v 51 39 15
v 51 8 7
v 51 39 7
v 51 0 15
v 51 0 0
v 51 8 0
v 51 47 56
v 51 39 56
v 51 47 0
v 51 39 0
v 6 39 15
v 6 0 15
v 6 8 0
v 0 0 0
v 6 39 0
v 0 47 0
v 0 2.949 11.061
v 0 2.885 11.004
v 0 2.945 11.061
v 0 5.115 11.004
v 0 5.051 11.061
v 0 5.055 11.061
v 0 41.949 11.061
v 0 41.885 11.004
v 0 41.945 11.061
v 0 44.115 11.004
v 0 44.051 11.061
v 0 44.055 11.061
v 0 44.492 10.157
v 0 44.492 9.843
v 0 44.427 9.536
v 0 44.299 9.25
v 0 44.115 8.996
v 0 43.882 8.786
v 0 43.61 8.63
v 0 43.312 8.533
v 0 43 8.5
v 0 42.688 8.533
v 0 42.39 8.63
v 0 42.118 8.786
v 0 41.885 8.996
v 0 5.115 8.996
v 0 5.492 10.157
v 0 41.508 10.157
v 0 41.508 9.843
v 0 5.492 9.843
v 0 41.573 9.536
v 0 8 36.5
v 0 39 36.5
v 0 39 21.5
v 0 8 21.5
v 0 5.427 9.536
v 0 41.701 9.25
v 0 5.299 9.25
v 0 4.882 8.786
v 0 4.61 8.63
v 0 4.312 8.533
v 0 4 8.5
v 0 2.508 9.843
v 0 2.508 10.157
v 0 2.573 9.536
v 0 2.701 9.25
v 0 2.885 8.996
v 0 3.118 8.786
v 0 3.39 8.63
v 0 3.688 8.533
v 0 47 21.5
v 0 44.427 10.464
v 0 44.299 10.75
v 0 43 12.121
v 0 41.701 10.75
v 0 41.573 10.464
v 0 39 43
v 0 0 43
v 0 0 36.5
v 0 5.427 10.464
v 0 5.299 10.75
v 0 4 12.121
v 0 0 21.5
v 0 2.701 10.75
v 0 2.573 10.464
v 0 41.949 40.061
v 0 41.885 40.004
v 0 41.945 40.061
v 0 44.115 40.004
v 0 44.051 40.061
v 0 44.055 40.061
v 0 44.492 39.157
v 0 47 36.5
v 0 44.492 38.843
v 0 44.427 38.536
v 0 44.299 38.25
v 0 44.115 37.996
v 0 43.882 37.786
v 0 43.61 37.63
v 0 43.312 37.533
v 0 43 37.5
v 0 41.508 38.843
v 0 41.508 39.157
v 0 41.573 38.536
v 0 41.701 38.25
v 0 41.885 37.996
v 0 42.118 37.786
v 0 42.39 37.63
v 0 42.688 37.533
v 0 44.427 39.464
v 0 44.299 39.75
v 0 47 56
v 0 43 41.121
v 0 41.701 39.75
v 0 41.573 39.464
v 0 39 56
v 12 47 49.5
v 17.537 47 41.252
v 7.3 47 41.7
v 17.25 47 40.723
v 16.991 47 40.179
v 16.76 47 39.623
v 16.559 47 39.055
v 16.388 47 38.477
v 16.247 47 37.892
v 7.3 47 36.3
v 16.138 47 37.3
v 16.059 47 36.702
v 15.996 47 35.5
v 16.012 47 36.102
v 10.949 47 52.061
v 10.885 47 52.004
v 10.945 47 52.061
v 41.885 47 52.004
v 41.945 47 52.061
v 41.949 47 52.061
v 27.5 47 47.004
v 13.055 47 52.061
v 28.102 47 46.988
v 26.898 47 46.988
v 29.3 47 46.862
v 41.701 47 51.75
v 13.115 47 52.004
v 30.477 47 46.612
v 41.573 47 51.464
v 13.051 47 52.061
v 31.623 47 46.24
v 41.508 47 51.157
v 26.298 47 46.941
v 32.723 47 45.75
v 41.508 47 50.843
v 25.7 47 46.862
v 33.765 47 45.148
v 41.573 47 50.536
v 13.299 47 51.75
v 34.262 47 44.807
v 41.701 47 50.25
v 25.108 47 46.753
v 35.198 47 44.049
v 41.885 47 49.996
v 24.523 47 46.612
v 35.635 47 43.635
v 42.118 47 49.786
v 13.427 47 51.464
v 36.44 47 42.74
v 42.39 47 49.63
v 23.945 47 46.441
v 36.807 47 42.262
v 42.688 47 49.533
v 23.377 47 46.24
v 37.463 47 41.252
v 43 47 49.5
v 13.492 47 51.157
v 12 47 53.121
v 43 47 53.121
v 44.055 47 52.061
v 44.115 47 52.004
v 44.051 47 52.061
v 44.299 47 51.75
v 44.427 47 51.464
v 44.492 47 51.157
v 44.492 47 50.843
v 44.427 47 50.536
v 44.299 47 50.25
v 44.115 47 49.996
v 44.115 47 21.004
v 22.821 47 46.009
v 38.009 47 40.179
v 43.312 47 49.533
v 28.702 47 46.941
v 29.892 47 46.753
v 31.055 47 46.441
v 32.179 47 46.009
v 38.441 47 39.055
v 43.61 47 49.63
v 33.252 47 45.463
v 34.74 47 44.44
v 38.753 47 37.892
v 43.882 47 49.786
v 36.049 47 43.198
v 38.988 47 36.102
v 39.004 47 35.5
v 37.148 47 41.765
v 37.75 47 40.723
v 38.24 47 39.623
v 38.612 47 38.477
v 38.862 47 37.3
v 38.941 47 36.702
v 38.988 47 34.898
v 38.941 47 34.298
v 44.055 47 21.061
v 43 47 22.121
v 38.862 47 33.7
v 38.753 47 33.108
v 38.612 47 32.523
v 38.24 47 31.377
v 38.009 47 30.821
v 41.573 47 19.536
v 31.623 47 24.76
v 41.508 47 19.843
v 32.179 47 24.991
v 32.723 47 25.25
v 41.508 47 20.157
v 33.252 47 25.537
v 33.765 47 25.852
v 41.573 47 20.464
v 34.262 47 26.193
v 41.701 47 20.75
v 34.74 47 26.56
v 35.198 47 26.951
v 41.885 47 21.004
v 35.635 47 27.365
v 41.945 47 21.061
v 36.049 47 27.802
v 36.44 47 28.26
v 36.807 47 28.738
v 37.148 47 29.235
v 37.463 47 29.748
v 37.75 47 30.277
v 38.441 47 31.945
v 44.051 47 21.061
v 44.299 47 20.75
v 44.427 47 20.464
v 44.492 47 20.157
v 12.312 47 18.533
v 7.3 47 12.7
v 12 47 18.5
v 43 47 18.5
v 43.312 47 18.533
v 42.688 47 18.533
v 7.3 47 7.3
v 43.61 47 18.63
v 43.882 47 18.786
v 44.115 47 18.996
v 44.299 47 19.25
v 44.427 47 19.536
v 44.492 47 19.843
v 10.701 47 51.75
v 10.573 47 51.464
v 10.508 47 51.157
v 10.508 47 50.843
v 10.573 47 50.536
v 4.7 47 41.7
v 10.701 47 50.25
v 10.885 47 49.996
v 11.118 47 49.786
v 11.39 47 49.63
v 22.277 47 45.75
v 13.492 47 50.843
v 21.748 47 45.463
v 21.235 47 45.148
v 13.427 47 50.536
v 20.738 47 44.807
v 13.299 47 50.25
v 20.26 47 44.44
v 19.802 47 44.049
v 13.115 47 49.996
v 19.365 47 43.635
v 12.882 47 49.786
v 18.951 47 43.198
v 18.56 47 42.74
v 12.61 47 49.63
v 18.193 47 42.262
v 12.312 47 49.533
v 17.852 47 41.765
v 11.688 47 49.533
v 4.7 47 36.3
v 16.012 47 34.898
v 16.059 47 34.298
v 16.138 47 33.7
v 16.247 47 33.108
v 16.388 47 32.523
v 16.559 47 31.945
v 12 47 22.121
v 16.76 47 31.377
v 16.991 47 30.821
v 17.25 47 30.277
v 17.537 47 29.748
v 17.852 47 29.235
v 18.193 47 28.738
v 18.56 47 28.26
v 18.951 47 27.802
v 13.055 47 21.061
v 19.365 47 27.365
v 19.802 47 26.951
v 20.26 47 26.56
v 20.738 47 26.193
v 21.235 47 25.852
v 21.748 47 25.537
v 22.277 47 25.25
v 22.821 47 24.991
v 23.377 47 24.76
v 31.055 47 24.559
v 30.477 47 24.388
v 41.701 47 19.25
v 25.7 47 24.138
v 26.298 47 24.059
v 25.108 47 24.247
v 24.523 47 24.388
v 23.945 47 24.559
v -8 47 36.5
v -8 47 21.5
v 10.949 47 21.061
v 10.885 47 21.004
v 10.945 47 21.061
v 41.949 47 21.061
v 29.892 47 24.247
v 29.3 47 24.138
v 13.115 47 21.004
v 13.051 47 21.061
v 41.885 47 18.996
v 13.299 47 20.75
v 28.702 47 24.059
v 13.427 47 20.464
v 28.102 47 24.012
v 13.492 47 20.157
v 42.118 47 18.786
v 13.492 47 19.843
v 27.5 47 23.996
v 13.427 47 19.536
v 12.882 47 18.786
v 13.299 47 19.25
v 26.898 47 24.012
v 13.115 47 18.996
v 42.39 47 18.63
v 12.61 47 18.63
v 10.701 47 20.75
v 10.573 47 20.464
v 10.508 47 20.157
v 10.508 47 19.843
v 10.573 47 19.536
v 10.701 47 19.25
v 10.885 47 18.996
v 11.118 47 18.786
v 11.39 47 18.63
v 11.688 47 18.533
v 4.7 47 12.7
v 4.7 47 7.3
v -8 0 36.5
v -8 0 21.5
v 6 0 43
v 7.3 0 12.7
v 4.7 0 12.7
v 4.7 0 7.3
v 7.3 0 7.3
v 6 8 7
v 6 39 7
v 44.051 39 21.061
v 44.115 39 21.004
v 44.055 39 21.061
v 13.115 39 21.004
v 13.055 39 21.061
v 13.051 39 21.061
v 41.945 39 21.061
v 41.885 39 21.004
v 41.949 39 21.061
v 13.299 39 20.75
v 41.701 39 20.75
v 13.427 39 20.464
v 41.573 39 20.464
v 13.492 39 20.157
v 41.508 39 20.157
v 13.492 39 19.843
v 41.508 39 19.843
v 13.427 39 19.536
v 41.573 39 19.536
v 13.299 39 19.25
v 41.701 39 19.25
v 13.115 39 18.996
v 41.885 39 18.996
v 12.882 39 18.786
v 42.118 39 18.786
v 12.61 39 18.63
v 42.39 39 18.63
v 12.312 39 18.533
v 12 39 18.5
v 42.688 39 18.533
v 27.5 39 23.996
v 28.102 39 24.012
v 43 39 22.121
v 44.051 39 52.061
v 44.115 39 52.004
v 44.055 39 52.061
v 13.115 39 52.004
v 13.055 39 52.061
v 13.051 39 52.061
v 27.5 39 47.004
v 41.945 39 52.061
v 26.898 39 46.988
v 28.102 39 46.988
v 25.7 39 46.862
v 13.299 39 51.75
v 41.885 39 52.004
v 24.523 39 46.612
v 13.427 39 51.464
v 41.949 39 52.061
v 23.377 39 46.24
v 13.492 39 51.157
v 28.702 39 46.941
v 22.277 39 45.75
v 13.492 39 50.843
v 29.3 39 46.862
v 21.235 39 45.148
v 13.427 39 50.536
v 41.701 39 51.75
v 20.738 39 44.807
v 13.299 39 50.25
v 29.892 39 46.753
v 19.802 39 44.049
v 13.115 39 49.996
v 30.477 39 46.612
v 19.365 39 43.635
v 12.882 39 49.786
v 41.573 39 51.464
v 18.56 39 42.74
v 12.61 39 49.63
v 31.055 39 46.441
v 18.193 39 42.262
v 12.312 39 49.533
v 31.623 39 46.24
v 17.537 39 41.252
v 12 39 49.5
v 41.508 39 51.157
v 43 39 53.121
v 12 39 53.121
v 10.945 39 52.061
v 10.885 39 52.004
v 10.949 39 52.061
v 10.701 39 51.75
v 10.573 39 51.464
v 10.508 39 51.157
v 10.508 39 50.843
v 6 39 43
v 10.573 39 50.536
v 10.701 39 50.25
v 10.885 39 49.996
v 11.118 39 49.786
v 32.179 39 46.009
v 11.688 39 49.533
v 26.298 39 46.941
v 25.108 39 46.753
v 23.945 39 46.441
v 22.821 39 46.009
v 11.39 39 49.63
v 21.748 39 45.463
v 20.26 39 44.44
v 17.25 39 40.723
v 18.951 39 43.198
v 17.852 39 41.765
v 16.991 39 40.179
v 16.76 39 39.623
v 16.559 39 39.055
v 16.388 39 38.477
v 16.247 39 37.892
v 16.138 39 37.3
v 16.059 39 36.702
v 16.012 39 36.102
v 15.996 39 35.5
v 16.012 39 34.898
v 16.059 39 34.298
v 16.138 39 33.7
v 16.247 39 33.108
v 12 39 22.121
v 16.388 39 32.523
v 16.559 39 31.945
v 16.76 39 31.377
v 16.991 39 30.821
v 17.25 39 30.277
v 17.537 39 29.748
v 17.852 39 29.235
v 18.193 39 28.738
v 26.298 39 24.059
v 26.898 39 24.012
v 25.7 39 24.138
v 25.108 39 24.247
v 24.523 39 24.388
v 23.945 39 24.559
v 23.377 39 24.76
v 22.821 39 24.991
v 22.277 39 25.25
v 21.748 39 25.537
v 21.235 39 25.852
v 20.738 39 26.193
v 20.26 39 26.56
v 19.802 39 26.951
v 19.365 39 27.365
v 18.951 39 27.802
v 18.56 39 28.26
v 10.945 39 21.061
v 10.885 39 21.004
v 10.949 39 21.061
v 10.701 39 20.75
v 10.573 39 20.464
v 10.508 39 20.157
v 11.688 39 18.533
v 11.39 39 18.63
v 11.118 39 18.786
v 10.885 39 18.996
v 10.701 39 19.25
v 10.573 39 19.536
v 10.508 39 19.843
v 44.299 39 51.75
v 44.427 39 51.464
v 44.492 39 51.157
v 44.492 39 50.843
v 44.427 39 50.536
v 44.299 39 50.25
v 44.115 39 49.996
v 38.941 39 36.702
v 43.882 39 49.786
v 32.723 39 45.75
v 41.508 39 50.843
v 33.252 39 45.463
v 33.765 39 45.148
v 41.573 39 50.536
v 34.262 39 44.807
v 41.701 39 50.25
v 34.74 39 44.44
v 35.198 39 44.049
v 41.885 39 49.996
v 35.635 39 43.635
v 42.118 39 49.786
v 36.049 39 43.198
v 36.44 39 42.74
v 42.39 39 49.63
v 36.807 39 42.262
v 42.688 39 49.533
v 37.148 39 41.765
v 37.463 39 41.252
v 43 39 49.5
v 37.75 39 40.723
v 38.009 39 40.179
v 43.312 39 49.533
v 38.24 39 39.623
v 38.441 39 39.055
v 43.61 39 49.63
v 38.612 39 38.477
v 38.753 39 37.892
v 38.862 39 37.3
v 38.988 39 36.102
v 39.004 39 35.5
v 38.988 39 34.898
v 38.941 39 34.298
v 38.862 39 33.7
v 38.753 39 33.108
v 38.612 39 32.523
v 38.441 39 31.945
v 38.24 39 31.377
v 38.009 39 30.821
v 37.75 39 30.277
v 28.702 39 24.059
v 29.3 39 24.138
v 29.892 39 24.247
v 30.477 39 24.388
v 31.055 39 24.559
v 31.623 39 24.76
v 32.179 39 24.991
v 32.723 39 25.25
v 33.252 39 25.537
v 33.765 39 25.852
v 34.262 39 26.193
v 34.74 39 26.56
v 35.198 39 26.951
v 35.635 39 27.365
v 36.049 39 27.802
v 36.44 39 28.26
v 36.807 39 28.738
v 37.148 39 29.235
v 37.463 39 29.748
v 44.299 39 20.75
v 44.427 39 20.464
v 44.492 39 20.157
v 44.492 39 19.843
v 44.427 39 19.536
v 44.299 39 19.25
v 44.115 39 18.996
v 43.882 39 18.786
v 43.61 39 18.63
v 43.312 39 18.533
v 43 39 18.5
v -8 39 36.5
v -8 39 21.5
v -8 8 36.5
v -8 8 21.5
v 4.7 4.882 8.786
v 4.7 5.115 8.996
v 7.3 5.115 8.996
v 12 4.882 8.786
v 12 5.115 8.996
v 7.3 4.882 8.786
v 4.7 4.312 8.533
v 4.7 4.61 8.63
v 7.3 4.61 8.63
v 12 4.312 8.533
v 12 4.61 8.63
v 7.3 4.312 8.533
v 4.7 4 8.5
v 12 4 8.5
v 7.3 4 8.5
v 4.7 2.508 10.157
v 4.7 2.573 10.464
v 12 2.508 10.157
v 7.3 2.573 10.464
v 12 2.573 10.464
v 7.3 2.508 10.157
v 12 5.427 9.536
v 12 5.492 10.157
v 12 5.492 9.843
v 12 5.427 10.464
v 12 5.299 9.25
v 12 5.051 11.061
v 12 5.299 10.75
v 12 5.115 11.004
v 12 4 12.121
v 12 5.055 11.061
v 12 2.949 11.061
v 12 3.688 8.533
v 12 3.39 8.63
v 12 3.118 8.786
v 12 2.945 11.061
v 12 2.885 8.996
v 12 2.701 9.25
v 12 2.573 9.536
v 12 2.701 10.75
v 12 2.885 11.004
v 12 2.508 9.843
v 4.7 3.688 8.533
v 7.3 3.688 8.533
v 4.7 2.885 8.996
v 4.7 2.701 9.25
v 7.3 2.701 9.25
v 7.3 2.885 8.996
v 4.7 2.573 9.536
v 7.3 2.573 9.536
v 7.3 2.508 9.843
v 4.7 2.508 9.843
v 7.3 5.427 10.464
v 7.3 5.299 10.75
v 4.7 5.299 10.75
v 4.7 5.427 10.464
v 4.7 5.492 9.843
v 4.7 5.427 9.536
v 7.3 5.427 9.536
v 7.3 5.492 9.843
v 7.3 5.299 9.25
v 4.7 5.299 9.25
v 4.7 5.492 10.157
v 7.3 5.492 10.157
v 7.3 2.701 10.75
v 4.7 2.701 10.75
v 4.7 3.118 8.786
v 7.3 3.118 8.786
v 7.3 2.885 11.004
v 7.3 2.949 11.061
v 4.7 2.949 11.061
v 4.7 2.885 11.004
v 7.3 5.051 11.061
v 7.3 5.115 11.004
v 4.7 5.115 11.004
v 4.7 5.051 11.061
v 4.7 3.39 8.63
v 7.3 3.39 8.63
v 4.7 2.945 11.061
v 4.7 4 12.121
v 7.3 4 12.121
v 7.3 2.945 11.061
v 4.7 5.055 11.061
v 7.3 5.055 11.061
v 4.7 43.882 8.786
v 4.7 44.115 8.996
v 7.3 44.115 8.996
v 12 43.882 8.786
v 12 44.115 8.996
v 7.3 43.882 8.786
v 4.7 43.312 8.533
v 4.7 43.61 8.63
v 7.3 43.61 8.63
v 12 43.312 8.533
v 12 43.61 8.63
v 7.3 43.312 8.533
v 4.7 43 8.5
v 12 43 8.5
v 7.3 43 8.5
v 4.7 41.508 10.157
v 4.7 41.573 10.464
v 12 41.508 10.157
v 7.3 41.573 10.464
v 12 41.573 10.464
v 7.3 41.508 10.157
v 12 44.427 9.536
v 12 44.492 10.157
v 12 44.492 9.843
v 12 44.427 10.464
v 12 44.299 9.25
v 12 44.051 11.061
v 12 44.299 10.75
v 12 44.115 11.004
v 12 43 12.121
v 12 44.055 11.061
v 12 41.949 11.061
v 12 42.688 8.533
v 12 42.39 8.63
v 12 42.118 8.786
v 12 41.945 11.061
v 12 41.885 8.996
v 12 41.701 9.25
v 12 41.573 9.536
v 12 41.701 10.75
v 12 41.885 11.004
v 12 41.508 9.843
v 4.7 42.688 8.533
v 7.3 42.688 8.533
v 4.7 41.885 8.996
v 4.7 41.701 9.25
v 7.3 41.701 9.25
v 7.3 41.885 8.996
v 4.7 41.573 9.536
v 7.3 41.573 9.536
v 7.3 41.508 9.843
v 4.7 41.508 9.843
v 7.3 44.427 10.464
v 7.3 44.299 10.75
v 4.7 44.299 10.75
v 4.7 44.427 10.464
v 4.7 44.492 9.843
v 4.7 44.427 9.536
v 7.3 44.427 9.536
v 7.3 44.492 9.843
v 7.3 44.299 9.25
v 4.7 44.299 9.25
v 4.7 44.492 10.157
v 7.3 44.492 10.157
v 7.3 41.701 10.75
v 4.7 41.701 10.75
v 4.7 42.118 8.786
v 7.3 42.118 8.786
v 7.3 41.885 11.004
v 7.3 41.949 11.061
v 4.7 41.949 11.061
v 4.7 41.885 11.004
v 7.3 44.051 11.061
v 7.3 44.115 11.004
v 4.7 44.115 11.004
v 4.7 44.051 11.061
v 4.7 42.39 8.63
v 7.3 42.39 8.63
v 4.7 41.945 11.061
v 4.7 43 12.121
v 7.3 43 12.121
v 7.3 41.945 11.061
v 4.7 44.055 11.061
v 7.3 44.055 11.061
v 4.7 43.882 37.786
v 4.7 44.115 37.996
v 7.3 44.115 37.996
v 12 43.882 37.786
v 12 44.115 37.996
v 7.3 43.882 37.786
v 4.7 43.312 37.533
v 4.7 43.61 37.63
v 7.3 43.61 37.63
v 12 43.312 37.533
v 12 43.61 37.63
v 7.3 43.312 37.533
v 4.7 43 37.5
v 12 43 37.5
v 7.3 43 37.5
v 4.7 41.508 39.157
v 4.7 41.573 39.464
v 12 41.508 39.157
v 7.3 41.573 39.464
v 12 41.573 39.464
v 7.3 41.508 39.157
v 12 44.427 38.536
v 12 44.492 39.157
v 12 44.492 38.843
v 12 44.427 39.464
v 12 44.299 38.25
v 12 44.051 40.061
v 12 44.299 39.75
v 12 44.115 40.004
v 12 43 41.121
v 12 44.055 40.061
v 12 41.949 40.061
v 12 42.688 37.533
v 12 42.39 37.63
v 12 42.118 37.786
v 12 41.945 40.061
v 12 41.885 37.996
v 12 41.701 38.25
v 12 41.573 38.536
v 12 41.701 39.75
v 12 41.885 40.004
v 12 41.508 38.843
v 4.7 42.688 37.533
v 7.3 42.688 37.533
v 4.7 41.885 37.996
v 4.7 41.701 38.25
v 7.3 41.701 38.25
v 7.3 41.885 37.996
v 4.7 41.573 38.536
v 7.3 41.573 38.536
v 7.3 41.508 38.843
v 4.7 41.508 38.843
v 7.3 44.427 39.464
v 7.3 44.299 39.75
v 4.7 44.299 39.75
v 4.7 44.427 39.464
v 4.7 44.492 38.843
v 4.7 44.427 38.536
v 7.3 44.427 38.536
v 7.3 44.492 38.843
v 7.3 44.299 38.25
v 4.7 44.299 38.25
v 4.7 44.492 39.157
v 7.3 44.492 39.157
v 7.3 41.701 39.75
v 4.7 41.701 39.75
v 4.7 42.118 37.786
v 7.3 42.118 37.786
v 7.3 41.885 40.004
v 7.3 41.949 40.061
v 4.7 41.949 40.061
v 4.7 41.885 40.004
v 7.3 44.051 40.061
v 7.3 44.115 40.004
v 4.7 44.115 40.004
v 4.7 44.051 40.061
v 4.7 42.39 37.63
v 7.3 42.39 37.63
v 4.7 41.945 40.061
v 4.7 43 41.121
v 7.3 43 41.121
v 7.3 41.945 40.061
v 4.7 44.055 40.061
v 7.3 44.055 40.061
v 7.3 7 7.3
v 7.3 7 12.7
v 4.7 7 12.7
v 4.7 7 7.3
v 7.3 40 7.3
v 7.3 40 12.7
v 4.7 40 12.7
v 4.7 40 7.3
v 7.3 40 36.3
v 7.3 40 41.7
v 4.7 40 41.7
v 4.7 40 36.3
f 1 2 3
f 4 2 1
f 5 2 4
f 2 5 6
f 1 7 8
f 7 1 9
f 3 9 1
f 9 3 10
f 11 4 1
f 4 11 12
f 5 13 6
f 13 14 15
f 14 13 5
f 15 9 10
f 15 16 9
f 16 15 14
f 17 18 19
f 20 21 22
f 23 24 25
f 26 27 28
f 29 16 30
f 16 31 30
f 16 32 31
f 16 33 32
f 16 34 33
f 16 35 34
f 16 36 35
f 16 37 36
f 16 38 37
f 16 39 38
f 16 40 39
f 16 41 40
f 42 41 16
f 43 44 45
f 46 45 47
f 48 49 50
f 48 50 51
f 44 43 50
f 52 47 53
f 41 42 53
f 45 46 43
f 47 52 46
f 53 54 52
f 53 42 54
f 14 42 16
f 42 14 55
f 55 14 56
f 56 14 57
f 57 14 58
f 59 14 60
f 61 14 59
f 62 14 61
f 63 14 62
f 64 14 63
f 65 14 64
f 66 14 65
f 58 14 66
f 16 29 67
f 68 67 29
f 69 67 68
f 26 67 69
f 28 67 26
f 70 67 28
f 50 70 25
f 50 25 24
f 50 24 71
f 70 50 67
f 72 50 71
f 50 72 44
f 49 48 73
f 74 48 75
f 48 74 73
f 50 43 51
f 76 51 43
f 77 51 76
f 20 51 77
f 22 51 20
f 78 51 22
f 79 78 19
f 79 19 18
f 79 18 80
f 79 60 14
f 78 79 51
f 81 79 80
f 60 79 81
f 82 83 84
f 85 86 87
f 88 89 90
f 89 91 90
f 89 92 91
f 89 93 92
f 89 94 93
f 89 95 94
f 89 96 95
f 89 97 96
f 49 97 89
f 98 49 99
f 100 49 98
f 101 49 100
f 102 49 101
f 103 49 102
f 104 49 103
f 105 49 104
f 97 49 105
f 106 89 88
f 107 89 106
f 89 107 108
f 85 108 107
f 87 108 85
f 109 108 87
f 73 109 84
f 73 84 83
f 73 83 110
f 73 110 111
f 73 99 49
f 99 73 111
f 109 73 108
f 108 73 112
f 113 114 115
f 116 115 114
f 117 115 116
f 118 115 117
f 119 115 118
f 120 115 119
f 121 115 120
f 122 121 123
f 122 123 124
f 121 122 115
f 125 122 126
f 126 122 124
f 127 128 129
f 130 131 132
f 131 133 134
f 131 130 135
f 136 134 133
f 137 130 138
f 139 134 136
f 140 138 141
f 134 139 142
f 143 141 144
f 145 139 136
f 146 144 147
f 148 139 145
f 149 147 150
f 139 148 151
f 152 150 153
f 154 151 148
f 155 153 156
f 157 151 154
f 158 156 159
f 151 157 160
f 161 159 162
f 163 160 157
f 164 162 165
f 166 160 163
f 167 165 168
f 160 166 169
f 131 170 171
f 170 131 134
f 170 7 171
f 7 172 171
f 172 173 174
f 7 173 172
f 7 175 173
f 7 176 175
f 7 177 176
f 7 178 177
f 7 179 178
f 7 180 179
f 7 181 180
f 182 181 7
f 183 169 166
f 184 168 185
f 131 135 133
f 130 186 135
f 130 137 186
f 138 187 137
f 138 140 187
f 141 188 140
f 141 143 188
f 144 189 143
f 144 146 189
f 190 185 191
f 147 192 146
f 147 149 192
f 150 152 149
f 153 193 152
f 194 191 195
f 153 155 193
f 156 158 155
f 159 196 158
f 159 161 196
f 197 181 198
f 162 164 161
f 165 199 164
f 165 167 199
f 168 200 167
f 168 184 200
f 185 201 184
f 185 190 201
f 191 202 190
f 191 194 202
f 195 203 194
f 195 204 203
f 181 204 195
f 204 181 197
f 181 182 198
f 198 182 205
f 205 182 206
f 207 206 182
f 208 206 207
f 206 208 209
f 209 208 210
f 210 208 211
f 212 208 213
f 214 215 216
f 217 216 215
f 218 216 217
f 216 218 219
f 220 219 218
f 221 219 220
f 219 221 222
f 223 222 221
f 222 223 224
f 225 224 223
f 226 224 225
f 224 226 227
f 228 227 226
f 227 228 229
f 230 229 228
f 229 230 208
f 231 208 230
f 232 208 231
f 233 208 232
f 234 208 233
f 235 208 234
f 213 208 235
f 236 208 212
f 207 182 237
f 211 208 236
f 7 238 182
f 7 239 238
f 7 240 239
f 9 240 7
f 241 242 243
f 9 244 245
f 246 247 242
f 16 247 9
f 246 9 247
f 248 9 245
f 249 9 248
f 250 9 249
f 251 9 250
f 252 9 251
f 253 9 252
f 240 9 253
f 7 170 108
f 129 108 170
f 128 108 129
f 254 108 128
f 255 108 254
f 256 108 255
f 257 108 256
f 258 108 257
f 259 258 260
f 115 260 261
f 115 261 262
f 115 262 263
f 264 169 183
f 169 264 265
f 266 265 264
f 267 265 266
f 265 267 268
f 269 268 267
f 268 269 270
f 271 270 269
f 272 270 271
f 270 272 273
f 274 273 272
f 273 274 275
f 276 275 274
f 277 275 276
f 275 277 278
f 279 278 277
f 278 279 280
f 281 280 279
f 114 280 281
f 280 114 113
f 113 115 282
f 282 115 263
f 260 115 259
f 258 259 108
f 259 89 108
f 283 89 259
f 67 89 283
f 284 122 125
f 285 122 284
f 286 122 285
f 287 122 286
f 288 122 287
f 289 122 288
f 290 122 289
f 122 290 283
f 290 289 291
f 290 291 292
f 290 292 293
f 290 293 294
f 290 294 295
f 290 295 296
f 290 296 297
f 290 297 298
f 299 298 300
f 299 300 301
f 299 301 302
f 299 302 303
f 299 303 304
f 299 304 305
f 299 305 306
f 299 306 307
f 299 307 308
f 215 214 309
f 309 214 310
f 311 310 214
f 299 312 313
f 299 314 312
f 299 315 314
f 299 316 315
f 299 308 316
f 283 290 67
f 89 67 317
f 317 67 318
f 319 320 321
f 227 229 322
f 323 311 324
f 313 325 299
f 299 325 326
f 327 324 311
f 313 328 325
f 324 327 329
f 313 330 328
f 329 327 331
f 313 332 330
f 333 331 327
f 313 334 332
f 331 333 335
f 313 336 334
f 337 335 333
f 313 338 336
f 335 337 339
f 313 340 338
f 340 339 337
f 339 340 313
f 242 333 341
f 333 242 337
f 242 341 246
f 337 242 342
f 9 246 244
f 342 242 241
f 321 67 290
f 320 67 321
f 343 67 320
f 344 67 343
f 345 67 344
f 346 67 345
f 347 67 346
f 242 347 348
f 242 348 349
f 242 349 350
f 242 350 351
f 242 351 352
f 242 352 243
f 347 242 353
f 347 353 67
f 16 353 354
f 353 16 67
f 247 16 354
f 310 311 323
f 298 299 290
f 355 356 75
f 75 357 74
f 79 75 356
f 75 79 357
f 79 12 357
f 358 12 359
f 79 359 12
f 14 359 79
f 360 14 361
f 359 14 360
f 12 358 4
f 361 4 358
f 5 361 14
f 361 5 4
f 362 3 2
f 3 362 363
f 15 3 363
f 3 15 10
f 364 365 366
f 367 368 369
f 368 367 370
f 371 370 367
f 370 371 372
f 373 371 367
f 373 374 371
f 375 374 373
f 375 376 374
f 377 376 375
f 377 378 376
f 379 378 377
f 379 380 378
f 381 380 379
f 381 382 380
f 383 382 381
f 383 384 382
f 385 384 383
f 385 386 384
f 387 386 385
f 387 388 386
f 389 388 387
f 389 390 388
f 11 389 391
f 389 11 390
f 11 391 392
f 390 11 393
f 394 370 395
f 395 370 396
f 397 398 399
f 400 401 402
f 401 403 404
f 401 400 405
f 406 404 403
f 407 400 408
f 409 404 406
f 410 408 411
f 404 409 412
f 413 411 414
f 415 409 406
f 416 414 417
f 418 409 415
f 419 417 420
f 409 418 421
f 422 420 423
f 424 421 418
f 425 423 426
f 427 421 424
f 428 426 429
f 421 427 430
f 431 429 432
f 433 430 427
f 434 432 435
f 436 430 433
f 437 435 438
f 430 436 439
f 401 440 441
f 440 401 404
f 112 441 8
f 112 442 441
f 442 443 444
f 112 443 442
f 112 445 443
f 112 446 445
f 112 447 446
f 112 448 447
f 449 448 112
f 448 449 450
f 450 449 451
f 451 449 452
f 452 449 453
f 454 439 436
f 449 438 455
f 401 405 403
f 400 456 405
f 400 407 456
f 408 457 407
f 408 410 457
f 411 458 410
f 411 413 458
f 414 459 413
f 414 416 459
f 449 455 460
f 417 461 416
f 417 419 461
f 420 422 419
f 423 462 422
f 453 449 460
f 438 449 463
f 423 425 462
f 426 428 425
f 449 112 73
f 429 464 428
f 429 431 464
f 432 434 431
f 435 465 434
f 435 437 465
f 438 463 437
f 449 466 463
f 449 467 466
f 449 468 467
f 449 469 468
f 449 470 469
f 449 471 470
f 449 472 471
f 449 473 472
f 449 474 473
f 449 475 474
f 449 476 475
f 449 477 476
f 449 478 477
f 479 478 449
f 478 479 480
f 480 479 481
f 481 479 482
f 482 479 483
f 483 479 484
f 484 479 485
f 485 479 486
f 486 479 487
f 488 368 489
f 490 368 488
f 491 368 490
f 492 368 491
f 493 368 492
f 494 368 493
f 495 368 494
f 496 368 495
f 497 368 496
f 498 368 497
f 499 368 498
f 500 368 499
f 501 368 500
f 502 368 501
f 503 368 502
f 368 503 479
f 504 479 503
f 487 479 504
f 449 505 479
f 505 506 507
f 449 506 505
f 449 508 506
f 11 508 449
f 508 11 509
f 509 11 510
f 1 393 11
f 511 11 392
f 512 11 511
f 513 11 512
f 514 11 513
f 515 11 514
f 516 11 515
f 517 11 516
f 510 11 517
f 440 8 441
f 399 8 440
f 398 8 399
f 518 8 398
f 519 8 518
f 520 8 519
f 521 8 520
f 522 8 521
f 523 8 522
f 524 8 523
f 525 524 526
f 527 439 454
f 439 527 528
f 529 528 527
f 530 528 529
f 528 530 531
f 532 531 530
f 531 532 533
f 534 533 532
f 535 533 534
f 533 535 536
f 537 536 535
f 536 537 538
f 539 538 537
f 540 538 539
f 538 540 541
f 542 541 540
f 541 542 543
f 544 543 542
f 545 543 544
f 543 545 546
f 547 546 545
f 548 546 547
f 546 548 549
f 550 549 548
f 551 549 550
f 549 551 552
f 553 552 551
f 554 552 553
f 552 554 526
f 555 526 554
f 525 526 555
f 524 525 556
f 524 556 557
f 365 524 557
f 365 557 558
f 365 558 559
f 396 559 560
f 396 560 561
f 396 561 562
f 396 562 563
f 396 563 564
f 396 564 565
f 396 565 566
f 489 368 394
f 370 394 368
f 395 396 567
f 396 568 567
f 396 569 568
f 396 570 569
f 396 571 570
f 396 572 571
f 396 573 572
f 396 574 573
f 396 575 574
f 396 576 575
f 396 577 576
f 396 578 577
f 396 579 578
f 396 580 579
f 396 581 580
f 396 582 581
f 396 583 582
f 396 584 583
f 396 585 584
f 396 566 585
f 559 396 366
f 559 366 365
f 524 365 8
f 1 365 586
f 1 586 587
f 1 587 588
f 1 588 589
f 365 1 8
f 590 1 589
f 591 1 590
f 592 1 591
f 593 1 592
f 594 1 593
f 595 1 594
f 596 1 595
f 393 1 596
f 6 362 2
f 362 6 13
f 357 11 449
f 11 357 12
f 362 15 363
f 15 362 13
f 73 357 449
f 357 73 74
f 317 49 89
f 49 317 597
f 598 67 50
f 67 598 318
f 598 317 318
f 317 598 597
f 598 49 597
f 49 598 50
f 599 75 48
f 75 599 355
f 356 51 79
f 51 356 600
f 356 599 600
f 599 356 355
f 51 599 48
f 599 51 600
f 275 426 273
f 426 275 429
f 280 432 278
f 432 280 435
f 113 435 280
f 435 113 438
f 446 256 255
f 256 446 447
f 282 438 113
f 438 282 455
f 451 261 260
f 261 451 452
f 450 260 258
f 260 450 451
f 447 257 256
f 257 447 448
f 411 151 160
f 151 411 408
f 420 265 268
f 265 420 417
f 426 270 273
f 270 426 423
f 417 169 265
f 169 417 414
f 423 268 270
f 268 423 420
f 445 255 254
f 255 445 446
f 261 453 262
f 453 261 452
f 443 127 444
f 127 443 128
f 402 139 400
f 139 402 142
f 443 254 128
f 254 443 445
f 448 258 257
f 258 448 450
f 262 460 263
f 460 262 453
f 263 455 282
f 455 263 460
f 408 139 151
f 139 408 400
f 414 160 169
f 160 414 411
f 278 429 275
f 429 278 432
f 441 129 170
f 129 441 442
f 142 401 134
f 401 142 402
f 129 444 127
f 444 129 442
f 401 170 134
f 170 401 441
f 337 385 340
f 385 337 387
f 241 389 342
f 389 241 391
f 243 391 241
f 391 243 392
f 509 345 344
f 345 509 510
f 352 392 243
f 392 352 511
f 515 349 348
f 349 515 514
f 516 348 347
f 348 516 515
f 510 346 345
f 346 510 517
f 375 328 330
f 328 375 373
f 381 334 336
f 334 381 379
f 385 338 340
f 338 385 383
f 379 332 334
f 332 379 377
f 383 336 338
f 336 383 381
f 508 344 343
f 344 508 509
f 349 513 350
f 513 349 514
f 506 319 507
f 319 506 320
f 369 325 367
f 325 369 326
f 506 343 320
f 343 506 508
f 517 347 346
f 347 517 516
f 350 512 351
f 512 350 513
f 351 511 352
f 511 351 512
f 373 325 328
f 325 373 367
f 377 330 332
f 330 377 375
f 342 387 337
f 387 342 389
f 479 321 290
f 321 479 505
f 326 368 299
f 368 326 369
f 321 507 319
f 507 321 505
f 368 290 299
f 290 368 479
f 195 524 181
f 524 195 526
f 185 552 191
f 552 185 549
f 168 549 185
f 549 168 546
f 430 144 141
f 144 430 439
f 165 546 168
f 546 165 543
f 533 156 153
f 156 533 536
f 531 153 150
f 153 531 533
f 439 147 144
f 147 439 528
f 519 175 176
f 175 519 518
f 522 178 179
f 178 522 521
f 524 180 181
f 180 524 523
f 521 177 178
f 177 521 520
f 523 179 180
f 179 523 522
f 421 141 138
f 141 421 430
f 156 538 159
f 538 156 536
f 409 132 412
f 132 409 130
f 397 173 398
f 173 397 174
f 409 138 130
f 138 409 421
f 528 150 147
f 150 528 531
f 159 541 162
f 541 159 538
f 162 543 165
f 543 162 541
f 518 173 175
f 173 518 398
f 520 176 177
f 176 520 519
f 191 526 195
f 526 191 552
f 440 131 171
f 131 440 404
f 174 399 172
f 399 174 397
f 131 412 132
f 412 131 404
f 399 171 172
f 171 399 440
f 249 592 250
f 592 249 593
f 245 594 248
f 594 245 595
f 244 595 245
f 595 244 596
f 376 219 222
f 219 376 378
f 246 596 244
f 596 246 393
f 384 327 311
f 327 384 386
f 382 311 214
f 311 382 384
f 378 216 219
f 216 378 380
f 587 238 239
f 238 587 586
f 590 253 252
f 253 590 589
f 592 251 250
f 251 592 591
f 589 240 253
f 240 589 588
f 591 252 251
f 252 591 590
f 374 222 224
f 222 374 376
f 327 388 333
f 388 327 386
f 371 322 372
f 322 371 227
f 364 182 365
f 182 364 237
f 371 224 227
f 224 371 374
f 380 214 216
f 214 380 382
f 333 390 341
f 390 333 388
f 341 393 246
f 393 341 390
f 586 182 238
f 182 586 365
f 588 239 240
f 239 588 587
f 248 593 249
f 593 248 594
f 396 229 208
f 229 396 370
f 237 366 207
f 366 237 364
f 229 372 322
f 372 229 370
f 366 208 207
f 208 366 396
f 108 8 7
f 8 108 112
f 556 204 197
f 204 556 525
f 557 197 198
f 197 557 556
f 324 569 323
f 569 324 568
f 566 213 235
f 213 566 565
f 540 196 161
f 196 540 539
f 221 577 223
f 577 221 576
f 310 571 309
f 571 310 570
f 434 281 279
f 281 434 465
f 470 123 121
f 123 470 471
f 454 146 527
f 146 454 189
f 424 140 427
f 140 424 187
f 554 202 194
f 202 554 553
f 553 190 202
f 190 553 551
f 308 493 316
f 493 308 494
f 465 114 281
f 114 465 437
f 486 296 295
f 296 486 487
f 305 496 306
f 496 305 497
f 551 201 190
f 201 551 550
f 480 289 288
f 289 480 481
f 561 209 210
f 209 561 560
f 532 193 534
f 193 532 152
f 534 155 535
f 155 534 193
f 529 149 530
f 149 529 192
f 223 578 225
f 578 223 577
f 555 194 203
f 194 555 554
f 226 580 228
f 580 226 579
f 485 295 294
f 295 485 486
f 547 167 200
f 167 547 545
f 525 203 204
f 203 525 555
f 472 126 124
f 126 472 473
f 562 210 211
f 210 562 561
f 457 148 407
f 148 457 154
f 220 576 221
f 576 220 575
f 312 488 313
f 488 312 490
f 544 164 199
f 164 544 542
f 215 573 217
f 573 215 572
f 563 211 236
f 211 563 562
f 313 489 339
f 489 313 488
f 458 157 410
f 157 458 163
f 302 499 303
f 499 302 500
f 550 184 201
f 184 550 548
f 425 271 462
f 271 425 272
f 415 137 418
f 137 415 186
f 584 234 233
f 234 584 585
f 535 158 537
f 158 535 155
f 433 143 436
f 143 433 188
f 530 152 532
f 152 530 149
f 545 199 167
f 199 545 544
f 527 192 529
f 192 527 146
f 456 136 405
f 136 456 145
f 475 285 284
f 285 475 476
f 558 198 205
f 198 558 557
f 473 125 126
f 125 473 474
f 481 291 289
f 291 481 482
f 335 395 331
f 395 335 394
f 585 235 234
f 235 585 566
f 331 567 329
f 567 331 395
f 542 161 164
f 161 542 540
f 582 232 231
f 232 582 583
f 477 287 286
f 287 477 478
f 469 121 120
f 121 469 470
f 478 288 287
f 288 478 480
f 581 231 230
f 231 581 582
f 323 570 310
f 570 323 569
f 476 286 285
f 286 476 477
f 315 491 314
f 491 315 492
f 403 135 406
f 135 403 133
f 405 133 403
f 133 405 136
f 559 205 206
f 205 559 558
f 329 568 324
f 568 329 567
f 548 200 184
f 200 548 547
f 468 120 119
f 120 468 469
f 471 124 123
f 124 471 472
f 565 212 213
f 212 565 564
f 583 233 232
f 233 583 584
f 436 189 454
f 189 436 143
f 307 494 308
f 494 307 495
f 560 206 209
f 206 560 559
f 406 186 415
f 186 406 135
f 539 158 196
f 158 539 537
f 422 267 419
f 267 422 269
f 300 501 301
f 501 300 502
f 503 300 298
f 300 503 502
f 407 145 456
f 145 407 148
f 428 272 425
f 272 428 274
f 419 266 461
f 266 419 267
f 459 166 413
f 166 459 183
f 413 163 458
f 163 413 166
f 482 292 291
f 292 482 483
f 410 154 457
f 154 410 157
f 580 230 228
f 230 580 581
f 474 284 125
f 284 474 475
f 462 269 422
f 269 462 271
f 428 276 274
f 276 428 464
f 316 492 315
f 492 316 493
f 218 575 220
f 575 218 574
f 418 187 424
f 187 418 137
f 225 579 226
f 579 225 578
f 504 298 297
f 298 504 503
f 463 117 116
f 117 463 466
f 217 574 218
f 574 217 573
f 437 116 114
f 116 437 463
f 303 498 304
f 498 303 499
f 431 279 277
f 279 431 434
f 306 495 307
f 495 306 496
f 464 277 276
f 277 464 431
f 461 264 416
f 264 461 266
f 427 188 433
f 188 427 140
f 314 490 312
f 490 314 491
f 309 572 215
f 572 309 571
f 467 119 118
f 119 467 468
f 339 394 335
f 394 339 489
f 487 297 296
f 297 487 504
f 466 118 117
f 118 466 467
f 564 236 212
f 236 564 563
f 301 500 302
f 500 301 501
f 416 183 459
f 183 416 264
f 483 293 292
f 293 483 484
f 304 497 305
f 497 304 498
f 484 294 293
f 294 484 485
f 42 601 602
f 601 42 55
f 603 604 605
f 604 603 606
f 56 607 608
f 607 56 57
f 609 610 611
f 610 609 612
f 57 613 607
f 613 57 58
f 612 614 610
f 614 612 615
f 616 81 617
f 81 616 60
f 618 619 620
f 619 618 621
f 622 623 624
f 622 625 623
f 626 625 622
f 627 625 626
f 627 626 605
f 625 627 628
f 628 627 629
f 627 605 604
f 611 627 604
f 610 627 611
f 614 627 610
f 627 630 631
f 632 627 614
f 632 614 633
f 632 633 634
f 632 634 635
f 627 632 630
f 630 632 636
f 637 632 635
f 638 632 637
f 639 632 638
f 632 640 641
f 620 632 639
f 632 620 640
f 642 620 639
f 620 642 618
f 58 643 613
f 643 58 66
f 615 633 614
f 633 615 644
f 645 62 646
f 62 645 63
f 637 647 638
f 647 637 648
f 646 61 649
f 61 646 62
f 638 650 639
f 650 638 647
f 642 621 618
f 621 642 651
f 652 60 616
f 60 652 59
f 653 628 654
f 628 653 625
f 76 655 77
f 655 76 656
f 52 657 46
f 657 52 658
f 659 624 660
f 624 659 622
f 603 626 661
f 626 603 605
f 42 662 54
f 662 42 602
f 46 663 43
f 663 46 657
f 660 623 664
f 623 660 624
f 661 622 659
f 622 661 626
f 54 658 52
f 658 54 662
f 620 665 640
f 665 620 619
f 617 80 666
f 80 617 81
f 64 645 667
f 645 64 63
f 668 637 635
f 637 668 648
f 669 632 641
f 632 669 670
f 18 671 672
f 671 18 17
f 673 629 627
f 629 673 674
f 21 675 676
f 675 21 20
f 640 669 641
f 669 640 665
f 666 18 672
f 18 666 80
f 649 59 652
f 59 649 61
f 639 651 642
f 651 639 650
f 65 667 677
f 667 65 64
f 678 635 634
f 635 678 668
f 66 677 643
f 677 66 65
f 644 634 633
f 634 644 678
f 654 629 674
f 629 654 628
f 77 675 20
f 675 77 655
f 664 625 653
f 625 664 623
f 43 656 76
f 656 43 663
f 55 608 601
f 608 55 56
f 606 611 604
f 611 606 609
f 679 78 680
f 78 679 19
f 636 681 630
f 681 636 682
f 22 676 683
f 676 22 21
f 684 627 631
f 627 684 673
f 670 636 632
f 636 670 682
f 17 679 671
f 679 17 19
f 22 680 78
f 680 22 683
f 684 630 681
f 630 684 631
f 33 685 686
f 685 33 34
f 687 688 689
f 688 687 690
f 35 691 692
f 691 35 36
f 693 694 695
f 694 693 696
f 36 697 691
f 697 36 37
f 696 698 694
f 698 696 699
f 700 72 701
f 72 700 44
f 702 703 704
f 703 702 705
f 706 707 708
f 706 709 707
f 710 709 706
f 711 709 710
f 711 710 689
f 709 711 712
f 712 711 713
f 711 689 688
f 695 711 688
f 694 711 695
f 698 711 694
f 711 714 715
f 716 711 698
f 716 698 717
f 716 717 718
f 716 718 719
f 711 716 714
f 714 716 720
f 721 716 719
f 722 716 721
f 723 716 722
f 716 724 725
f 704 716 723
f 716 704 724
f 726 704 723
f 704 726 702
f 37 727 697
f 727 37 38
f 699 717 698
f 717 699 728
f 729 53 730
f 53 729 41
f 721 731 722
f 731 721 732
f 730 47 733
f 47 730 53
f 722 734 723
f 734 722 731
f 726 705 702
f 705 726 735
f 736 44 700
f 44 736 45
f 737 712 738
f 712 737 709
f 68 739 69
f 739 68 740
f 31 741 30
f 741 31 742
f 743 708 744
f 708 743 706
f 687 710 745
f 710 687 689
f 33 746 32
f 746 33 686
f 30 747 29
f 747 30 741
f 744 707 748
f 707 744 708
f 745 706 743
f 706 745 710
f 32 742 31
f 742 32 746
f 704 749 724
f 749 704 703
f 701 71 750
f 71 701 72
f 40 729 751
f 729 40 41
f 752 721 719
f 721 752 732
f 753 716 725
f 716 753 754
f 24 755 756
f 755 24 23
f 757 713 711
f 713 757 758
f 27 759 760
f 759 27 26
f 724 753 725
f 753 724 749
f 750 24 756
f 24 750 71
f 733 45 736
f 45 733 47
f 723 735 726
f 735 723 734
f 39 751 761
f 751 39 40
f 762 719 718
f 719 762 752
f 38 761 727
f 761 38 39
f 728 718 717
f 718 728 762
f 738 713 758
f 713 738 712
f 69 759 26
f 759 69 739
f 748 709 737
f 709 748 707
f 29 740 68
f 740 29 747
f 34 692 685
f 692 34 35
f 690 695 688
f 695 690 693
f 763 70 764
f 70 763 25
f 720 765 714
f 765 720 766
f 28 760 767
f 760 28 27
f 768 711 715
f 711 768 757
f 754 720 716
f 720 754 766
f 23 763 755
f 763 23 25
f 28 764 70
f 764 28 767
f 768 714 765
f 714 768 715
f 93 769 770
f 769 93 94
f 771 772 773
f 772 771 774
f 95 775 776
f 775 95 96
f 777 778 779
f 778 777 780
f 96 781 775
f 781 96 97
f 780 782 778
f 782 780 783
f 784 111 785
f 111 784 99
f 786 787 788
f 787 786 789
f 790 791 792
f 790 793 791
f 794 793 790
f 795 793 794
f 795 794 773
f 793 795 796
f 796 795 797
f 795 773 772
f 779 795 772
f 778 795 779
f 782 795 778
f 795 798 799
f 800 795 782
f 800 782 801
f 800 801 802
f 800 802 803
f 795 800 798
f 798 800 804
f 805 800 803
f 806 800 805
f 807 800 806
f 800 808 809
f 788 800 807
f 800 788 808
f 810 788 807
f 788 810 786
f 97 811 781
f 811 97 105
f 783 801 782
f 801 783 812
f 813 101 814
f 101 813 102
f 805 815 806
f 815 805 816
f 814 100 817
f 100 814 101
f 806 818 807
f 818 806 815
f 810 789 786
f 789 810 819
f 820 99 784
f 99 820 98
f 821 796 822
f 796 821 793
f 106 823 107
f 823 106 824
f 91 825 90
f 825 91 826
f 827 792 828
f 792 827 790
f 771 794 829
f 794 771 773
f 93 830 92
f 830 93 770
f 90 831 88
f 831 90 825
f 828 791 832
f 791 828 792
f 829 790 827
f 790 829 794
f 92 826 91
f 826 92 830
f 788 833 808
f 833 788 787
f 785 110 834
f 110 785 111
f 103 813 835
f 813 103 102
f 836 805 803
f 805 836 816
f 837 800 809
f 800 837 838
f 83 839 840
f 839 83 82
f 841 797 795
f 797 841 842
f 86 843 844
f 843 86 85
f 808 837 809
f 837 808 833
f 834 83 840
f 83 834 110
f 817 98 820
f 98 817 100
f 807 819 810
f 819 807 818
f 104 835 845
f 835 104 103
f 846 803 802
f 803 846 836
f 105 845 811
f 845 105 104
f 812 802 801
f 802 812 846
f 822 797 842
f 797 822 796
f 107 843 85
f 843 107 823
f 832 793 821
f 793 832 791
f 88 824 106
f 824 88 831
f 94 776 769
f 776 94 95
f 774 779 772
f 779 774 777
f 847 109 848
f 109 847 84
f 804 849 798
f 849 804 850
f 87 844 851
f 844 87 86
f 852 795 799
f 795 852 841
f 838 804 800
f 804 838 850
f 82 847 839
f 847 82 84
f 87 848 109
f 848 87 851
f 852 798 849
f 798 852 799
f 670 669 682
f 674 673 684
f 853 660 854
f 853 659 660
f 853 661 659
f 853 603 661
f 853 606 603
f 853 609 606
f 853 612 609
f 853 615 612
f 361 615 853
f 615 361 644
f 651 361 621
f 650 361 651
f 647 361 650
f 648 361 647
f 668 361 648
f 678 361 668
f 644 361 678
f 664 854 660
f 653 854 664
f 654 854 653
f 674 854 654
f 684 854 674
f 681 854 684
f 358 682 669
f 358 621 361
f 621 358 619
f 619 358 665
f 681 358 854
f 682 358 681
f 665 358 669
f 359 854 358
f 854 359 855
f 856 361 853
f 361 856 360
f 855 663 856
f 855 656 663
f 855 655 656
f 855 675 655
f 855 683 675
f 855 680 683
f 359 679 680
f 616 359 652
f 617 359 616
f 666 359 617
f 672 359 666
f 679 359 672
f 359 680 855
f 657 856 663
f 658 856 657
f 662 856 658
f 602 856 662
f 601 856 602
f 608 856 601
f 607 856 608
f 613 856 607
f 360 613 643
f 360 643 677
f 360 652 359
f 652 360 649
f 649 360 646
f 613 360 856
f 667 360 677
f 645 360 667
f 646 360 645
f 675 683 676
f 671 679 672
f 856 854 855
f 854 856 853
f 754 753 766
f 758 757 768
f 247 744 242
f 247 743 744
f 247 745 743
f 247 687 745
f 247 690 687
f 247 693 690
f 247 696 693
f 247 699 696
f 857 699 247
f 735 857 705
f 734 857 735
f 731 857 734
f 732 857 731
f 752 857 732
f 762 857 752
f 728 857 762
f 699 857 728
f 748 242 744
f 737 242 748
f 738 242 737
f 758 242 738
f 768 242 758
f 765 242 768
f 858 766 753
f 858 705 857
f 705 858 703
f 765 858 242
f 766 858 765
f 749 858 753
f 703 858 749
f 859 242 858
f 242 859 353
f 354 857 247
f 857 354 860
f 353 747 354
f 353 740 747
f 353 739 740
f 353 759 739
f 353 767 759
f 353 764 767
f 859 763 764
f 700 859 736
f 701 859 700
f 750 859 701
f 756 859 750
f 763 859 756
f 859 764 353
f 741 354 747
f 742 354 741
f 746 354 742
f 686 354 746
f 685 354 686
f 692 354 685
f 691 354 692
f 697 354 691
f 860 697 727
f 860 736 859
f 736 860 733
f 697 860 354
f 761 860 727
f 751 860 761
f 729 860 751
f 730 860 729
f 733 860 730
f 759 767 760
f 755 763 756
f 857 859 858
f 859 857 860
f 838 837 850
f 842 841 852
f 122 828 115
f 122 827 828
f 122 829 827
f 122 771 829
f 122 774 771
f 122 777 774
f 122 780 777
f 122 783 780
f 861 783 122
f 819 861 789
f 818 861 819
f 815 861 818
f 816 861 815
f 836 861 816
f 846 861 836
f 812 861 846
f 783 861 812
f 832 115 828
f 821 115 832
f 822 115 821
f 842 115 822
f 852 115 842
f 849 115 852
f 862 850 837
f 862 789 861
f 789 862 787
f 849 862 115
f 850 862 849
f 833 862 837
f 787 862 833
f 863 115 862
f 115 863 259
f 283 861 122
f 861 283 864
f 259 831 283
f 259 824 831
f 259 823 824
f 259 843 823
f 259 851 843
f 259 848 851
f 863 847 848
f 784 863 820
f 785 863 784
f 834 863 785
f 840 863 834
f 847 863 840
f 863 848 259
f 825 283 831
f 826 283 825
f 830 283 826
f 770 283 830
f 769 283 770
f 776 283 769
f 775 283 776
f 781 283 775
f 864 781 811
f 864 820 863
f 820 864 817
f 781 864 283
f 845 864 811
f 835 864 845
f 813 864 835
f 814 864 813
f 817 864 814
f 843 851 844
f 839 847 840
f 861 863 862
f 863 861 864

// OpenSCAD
// Customizable Y Motor Mount for Anet A6
// Copyright: Olle Johansson 2018
// License: CC BY-SA

//CUSTOMIZER VARIABLES

backplate_thickness = 6;

type_of_mount_hole = "Teardrop"; // [Teardrop, Round]
mount_hole_diameter = 3;
mount_hole_length = 12;

//CUSTOMIZER VARIABLES END

/* [Hidden] */

$fn=120;


/* From http://www.thingiverse.com/thing:3457
   © 2010 whosawhatsis */
module teardrop(radius, length, angle) {
	rotate([0, angle, 0]) union() {
		linear_extrude(height = length, center = true, convexity = radius, twist = 0)
			circle(r = radius, center = true, $fn = 30);
		linear_extrude(height = length, center = true, convexity = radius, twist = 0)
			projection(cut = false) rotate([0, -angle, 0]) translate([0, 0, radius * sin(45) * 1.5]) cylinder(h = radius * sin(45), r1 = radius * sin(45), r2 = 0, center = true, $fn = 30);
    }
}

module cylinder_outer(diameter, height, fn) {
   fudge = 1 / cos(180 / fn);
   cylinder(h=height, r=diameter / 2 * fudge, $fn=fn, center=true);
}

module mount_hole(diameter, length) {
    if (type_of_mount_hole == "Teardrop") {
        rotate([0, 270, 0])
        teardrop(diameter/2, length, 90);
    } else {
        cylinder_outer(diameter, length, $fn);
    }
}

module motor_mount_plate() {
    translate([51/2, 47 - 8/2, 56/2])
    difference() {
        cube([51, 8, 56], center=true);
        
        // Motor shaft hole
        translate([6/3, 0, 15/2])
        rotate([90, 0, 0])
        cylinder_outer(23, 8, $fn);
        
        // Motor mount holes
        translate([6/3 - 31/2, 0, 15/2 + 31/2])
        rotate([90, 90, 0])
        mount_hole(mount_hole_diameter, 8, $fn);
        
        translate([6/3 - 31/2, 0, 15/2 - 31/2])
        rotate([90, 90, 0])
        mount_hole(mount_hole_diameter, 8, $fn);
        
        translate([6/3 + 31/2, 0, 15/2 + 31/2])
        rotate([90, 90, 0])
        mount_hole(mount_hole_diameter, 8, $fn);
 
        translate([6/3 + 31/2, 0, 15/2 - 31/2])
        rotate([90, 90, 0])
        mount_hole(mount_hole_diameter, 8, $fn);
   }    
}

module bottom_plate() {
    translate([51/2, 47/2, 15/2])
    difference() {
        cube([51, 47, 15], center=true);

        translate([0, 0, -4])
        cube([51, 31, 7], center=true);
    }
}

module back_plate() {
    translate([3, 47/2, 43/2])
    cube([6, 47, 43], center=true);
    
    translate([-4, 47 - 8/2, 43/2+15/2])
    cube([8, 8, 15], center=true);
    
    translate([-4, 8/2, 43/2+15/2])
    cube([8, 8, 15], center=true);
}

module backplate_mount_holes() {
    translate([6, 4, 10])
    rotate([0, 90, 0])
    mount_hole(mount_hole_diameter, mount_hole_length);
    
    // Trapped nut hole
    translate([6, 3.5, 10])
    cube([2.6, 7, 5.4], center=true);    

    translate([6, 47-4, 10])
    rotate([0, 90, 0])
    mount_hole(mount_hole_diameter, mount_hole_length);

    // Trapped nut hole
    translate([6, 47-3.5, 10])
    cube([2.6, 7, 5.4], center=true);    

    translate([6, 47-4, 39])
    rotate([0, 90, 0])
    mount_hole(mount_hole_diameter, mount_hole_length);
    
    // Trapped nut hole
    translate([6, 47-3.5, 39])
    cube([2.6, 7, 5.4], center=true);
}

module motor_mount() {
    difference() {
        union() {
            bottom_plate();
            back_plate();
            motor_mount_plate();
        }
        
        backplate_mount_holes();
    }
}

motor_mount();
